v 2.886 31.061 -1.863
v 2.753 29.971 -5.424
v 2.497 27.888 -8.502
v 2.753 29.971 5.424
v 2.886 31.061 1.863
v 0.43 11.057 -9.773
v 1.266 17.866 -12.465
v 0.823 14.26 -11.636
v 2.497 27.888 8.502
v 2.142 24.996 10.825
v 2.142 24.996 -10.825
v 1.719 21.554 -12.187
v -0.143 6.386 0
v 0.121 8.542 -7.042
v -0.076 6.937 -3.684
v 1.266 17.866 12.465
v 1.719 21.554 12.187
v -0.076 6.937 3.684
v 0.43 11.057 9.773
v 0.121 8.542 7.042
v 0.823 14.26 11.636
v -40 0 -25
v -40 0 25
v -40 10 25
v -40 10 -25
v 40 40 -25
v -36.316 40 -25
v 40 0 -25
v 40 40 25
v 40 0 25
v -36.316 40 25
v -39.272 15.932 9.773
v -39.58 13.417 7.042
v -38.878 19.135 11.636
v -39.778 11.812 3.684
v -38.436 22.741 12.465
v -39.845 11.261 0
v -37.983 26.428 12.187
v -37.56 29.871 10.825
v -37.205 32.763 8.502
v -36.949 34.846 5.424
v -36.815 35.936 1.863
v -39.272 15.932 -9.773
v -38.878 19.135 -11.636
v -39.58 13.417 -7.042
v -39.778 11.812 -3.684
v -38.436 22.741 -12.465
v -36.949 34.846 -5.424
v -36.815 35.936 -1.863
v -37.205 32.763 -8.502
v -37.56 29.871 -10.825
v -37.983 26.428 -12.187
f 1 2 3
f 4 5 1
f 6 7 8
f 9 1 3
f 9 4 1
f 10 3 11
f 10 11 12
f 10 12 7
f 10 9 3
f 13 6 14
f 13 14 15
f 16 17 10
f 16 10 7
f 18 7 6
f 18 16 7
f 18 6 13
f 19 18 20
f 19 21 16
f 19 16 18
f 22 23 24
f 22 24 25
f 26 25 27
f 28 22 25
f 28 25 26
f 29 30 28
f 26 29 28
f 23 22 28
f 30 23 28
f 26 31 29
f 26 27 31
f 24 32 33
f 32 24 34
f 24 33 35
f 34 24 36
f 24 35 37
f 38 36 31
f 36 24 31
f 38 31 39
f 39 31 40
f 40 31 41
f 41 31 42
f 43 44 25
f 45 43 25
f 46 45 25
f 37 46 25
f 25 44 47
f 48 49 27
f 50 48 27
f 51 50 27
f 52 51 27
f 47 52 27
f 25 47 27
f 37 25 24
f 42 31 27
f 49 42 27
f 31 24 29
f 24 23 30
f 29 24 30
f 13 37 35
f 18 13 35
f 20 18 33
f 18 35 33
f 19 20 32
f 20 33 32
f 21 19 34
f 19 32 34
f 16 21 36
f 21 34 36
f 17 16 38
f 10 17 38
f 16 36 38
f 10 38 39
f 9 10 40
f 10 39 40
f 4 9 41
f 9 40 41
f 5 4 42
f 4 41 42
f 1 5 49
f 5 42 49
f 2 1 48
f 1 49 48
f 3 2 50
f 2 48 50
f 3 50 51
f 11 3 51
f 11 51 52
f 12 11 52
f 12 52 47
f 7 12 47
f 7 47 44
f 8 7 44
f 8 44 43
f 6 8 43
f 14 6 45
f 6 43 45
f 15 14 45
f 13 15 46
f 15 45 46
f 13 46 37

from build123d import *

# Parameters (mm, degrees)
ESQUISSE1_W             = 80
ESQUISSE1_H             = 50
BOSS_EXTRU_1_DEPTH      = 40
CHANFREIN1_SIZE         = 30
CHANFREIN1_SIZE2        = 3.683536827
ESQUISSE2_R             = 12.5
ENL_V_MAT_EXTRU_1_DEPTH = 40


with BuildPart() as part:
    # Esquisse1 → Boss.-Extru.1 (new body)
    with BuildSketch(Plane(origin=(0, 0, 0), x_dir=(1, 0, 0), z_dir=(0, 1, 0))):
        Rectangle(ESQUISSE1_W, ESQUISSE1_H)
    extrude(amount=BOSS_EXTRU_1_DEPTH)

    # Chanfrein1
    chanfrein1_edges = [part.edges().sort_by_distance(p)[0] for p in [
        (-40, 40, 0),
    ]]
    chanfrein1_side = [part.faces().sort_by_distance(p)[0] for p in [
        (-40, 20, 0),
    ]]
    chamfer(chanfrein1_edges, length=CHANFREIN1_SIZE, length2=CHANFREIN1_SIZE2, reference=chanfrein1_side[0])

    # Esquisse2 → Enlèv. mat.-Extru.1 (cut)
    with BuildSketch(Plane(origin=(-40.615524004, 4.986959281, 0), x_dir=(0, 0, 1), z_dir=(-0.9925461516413225, 0.12186934340514435, 0))):
        with Locations(Location((0, 18.821046558, 0), (0, 0, 270))):
            Circle(ESQUISSE2_R)
    extrude(amount=-ENL_V_MAT_EXTRU_1_DEPTH, mode=Mode.SUBTRACT)


solid = part.part
